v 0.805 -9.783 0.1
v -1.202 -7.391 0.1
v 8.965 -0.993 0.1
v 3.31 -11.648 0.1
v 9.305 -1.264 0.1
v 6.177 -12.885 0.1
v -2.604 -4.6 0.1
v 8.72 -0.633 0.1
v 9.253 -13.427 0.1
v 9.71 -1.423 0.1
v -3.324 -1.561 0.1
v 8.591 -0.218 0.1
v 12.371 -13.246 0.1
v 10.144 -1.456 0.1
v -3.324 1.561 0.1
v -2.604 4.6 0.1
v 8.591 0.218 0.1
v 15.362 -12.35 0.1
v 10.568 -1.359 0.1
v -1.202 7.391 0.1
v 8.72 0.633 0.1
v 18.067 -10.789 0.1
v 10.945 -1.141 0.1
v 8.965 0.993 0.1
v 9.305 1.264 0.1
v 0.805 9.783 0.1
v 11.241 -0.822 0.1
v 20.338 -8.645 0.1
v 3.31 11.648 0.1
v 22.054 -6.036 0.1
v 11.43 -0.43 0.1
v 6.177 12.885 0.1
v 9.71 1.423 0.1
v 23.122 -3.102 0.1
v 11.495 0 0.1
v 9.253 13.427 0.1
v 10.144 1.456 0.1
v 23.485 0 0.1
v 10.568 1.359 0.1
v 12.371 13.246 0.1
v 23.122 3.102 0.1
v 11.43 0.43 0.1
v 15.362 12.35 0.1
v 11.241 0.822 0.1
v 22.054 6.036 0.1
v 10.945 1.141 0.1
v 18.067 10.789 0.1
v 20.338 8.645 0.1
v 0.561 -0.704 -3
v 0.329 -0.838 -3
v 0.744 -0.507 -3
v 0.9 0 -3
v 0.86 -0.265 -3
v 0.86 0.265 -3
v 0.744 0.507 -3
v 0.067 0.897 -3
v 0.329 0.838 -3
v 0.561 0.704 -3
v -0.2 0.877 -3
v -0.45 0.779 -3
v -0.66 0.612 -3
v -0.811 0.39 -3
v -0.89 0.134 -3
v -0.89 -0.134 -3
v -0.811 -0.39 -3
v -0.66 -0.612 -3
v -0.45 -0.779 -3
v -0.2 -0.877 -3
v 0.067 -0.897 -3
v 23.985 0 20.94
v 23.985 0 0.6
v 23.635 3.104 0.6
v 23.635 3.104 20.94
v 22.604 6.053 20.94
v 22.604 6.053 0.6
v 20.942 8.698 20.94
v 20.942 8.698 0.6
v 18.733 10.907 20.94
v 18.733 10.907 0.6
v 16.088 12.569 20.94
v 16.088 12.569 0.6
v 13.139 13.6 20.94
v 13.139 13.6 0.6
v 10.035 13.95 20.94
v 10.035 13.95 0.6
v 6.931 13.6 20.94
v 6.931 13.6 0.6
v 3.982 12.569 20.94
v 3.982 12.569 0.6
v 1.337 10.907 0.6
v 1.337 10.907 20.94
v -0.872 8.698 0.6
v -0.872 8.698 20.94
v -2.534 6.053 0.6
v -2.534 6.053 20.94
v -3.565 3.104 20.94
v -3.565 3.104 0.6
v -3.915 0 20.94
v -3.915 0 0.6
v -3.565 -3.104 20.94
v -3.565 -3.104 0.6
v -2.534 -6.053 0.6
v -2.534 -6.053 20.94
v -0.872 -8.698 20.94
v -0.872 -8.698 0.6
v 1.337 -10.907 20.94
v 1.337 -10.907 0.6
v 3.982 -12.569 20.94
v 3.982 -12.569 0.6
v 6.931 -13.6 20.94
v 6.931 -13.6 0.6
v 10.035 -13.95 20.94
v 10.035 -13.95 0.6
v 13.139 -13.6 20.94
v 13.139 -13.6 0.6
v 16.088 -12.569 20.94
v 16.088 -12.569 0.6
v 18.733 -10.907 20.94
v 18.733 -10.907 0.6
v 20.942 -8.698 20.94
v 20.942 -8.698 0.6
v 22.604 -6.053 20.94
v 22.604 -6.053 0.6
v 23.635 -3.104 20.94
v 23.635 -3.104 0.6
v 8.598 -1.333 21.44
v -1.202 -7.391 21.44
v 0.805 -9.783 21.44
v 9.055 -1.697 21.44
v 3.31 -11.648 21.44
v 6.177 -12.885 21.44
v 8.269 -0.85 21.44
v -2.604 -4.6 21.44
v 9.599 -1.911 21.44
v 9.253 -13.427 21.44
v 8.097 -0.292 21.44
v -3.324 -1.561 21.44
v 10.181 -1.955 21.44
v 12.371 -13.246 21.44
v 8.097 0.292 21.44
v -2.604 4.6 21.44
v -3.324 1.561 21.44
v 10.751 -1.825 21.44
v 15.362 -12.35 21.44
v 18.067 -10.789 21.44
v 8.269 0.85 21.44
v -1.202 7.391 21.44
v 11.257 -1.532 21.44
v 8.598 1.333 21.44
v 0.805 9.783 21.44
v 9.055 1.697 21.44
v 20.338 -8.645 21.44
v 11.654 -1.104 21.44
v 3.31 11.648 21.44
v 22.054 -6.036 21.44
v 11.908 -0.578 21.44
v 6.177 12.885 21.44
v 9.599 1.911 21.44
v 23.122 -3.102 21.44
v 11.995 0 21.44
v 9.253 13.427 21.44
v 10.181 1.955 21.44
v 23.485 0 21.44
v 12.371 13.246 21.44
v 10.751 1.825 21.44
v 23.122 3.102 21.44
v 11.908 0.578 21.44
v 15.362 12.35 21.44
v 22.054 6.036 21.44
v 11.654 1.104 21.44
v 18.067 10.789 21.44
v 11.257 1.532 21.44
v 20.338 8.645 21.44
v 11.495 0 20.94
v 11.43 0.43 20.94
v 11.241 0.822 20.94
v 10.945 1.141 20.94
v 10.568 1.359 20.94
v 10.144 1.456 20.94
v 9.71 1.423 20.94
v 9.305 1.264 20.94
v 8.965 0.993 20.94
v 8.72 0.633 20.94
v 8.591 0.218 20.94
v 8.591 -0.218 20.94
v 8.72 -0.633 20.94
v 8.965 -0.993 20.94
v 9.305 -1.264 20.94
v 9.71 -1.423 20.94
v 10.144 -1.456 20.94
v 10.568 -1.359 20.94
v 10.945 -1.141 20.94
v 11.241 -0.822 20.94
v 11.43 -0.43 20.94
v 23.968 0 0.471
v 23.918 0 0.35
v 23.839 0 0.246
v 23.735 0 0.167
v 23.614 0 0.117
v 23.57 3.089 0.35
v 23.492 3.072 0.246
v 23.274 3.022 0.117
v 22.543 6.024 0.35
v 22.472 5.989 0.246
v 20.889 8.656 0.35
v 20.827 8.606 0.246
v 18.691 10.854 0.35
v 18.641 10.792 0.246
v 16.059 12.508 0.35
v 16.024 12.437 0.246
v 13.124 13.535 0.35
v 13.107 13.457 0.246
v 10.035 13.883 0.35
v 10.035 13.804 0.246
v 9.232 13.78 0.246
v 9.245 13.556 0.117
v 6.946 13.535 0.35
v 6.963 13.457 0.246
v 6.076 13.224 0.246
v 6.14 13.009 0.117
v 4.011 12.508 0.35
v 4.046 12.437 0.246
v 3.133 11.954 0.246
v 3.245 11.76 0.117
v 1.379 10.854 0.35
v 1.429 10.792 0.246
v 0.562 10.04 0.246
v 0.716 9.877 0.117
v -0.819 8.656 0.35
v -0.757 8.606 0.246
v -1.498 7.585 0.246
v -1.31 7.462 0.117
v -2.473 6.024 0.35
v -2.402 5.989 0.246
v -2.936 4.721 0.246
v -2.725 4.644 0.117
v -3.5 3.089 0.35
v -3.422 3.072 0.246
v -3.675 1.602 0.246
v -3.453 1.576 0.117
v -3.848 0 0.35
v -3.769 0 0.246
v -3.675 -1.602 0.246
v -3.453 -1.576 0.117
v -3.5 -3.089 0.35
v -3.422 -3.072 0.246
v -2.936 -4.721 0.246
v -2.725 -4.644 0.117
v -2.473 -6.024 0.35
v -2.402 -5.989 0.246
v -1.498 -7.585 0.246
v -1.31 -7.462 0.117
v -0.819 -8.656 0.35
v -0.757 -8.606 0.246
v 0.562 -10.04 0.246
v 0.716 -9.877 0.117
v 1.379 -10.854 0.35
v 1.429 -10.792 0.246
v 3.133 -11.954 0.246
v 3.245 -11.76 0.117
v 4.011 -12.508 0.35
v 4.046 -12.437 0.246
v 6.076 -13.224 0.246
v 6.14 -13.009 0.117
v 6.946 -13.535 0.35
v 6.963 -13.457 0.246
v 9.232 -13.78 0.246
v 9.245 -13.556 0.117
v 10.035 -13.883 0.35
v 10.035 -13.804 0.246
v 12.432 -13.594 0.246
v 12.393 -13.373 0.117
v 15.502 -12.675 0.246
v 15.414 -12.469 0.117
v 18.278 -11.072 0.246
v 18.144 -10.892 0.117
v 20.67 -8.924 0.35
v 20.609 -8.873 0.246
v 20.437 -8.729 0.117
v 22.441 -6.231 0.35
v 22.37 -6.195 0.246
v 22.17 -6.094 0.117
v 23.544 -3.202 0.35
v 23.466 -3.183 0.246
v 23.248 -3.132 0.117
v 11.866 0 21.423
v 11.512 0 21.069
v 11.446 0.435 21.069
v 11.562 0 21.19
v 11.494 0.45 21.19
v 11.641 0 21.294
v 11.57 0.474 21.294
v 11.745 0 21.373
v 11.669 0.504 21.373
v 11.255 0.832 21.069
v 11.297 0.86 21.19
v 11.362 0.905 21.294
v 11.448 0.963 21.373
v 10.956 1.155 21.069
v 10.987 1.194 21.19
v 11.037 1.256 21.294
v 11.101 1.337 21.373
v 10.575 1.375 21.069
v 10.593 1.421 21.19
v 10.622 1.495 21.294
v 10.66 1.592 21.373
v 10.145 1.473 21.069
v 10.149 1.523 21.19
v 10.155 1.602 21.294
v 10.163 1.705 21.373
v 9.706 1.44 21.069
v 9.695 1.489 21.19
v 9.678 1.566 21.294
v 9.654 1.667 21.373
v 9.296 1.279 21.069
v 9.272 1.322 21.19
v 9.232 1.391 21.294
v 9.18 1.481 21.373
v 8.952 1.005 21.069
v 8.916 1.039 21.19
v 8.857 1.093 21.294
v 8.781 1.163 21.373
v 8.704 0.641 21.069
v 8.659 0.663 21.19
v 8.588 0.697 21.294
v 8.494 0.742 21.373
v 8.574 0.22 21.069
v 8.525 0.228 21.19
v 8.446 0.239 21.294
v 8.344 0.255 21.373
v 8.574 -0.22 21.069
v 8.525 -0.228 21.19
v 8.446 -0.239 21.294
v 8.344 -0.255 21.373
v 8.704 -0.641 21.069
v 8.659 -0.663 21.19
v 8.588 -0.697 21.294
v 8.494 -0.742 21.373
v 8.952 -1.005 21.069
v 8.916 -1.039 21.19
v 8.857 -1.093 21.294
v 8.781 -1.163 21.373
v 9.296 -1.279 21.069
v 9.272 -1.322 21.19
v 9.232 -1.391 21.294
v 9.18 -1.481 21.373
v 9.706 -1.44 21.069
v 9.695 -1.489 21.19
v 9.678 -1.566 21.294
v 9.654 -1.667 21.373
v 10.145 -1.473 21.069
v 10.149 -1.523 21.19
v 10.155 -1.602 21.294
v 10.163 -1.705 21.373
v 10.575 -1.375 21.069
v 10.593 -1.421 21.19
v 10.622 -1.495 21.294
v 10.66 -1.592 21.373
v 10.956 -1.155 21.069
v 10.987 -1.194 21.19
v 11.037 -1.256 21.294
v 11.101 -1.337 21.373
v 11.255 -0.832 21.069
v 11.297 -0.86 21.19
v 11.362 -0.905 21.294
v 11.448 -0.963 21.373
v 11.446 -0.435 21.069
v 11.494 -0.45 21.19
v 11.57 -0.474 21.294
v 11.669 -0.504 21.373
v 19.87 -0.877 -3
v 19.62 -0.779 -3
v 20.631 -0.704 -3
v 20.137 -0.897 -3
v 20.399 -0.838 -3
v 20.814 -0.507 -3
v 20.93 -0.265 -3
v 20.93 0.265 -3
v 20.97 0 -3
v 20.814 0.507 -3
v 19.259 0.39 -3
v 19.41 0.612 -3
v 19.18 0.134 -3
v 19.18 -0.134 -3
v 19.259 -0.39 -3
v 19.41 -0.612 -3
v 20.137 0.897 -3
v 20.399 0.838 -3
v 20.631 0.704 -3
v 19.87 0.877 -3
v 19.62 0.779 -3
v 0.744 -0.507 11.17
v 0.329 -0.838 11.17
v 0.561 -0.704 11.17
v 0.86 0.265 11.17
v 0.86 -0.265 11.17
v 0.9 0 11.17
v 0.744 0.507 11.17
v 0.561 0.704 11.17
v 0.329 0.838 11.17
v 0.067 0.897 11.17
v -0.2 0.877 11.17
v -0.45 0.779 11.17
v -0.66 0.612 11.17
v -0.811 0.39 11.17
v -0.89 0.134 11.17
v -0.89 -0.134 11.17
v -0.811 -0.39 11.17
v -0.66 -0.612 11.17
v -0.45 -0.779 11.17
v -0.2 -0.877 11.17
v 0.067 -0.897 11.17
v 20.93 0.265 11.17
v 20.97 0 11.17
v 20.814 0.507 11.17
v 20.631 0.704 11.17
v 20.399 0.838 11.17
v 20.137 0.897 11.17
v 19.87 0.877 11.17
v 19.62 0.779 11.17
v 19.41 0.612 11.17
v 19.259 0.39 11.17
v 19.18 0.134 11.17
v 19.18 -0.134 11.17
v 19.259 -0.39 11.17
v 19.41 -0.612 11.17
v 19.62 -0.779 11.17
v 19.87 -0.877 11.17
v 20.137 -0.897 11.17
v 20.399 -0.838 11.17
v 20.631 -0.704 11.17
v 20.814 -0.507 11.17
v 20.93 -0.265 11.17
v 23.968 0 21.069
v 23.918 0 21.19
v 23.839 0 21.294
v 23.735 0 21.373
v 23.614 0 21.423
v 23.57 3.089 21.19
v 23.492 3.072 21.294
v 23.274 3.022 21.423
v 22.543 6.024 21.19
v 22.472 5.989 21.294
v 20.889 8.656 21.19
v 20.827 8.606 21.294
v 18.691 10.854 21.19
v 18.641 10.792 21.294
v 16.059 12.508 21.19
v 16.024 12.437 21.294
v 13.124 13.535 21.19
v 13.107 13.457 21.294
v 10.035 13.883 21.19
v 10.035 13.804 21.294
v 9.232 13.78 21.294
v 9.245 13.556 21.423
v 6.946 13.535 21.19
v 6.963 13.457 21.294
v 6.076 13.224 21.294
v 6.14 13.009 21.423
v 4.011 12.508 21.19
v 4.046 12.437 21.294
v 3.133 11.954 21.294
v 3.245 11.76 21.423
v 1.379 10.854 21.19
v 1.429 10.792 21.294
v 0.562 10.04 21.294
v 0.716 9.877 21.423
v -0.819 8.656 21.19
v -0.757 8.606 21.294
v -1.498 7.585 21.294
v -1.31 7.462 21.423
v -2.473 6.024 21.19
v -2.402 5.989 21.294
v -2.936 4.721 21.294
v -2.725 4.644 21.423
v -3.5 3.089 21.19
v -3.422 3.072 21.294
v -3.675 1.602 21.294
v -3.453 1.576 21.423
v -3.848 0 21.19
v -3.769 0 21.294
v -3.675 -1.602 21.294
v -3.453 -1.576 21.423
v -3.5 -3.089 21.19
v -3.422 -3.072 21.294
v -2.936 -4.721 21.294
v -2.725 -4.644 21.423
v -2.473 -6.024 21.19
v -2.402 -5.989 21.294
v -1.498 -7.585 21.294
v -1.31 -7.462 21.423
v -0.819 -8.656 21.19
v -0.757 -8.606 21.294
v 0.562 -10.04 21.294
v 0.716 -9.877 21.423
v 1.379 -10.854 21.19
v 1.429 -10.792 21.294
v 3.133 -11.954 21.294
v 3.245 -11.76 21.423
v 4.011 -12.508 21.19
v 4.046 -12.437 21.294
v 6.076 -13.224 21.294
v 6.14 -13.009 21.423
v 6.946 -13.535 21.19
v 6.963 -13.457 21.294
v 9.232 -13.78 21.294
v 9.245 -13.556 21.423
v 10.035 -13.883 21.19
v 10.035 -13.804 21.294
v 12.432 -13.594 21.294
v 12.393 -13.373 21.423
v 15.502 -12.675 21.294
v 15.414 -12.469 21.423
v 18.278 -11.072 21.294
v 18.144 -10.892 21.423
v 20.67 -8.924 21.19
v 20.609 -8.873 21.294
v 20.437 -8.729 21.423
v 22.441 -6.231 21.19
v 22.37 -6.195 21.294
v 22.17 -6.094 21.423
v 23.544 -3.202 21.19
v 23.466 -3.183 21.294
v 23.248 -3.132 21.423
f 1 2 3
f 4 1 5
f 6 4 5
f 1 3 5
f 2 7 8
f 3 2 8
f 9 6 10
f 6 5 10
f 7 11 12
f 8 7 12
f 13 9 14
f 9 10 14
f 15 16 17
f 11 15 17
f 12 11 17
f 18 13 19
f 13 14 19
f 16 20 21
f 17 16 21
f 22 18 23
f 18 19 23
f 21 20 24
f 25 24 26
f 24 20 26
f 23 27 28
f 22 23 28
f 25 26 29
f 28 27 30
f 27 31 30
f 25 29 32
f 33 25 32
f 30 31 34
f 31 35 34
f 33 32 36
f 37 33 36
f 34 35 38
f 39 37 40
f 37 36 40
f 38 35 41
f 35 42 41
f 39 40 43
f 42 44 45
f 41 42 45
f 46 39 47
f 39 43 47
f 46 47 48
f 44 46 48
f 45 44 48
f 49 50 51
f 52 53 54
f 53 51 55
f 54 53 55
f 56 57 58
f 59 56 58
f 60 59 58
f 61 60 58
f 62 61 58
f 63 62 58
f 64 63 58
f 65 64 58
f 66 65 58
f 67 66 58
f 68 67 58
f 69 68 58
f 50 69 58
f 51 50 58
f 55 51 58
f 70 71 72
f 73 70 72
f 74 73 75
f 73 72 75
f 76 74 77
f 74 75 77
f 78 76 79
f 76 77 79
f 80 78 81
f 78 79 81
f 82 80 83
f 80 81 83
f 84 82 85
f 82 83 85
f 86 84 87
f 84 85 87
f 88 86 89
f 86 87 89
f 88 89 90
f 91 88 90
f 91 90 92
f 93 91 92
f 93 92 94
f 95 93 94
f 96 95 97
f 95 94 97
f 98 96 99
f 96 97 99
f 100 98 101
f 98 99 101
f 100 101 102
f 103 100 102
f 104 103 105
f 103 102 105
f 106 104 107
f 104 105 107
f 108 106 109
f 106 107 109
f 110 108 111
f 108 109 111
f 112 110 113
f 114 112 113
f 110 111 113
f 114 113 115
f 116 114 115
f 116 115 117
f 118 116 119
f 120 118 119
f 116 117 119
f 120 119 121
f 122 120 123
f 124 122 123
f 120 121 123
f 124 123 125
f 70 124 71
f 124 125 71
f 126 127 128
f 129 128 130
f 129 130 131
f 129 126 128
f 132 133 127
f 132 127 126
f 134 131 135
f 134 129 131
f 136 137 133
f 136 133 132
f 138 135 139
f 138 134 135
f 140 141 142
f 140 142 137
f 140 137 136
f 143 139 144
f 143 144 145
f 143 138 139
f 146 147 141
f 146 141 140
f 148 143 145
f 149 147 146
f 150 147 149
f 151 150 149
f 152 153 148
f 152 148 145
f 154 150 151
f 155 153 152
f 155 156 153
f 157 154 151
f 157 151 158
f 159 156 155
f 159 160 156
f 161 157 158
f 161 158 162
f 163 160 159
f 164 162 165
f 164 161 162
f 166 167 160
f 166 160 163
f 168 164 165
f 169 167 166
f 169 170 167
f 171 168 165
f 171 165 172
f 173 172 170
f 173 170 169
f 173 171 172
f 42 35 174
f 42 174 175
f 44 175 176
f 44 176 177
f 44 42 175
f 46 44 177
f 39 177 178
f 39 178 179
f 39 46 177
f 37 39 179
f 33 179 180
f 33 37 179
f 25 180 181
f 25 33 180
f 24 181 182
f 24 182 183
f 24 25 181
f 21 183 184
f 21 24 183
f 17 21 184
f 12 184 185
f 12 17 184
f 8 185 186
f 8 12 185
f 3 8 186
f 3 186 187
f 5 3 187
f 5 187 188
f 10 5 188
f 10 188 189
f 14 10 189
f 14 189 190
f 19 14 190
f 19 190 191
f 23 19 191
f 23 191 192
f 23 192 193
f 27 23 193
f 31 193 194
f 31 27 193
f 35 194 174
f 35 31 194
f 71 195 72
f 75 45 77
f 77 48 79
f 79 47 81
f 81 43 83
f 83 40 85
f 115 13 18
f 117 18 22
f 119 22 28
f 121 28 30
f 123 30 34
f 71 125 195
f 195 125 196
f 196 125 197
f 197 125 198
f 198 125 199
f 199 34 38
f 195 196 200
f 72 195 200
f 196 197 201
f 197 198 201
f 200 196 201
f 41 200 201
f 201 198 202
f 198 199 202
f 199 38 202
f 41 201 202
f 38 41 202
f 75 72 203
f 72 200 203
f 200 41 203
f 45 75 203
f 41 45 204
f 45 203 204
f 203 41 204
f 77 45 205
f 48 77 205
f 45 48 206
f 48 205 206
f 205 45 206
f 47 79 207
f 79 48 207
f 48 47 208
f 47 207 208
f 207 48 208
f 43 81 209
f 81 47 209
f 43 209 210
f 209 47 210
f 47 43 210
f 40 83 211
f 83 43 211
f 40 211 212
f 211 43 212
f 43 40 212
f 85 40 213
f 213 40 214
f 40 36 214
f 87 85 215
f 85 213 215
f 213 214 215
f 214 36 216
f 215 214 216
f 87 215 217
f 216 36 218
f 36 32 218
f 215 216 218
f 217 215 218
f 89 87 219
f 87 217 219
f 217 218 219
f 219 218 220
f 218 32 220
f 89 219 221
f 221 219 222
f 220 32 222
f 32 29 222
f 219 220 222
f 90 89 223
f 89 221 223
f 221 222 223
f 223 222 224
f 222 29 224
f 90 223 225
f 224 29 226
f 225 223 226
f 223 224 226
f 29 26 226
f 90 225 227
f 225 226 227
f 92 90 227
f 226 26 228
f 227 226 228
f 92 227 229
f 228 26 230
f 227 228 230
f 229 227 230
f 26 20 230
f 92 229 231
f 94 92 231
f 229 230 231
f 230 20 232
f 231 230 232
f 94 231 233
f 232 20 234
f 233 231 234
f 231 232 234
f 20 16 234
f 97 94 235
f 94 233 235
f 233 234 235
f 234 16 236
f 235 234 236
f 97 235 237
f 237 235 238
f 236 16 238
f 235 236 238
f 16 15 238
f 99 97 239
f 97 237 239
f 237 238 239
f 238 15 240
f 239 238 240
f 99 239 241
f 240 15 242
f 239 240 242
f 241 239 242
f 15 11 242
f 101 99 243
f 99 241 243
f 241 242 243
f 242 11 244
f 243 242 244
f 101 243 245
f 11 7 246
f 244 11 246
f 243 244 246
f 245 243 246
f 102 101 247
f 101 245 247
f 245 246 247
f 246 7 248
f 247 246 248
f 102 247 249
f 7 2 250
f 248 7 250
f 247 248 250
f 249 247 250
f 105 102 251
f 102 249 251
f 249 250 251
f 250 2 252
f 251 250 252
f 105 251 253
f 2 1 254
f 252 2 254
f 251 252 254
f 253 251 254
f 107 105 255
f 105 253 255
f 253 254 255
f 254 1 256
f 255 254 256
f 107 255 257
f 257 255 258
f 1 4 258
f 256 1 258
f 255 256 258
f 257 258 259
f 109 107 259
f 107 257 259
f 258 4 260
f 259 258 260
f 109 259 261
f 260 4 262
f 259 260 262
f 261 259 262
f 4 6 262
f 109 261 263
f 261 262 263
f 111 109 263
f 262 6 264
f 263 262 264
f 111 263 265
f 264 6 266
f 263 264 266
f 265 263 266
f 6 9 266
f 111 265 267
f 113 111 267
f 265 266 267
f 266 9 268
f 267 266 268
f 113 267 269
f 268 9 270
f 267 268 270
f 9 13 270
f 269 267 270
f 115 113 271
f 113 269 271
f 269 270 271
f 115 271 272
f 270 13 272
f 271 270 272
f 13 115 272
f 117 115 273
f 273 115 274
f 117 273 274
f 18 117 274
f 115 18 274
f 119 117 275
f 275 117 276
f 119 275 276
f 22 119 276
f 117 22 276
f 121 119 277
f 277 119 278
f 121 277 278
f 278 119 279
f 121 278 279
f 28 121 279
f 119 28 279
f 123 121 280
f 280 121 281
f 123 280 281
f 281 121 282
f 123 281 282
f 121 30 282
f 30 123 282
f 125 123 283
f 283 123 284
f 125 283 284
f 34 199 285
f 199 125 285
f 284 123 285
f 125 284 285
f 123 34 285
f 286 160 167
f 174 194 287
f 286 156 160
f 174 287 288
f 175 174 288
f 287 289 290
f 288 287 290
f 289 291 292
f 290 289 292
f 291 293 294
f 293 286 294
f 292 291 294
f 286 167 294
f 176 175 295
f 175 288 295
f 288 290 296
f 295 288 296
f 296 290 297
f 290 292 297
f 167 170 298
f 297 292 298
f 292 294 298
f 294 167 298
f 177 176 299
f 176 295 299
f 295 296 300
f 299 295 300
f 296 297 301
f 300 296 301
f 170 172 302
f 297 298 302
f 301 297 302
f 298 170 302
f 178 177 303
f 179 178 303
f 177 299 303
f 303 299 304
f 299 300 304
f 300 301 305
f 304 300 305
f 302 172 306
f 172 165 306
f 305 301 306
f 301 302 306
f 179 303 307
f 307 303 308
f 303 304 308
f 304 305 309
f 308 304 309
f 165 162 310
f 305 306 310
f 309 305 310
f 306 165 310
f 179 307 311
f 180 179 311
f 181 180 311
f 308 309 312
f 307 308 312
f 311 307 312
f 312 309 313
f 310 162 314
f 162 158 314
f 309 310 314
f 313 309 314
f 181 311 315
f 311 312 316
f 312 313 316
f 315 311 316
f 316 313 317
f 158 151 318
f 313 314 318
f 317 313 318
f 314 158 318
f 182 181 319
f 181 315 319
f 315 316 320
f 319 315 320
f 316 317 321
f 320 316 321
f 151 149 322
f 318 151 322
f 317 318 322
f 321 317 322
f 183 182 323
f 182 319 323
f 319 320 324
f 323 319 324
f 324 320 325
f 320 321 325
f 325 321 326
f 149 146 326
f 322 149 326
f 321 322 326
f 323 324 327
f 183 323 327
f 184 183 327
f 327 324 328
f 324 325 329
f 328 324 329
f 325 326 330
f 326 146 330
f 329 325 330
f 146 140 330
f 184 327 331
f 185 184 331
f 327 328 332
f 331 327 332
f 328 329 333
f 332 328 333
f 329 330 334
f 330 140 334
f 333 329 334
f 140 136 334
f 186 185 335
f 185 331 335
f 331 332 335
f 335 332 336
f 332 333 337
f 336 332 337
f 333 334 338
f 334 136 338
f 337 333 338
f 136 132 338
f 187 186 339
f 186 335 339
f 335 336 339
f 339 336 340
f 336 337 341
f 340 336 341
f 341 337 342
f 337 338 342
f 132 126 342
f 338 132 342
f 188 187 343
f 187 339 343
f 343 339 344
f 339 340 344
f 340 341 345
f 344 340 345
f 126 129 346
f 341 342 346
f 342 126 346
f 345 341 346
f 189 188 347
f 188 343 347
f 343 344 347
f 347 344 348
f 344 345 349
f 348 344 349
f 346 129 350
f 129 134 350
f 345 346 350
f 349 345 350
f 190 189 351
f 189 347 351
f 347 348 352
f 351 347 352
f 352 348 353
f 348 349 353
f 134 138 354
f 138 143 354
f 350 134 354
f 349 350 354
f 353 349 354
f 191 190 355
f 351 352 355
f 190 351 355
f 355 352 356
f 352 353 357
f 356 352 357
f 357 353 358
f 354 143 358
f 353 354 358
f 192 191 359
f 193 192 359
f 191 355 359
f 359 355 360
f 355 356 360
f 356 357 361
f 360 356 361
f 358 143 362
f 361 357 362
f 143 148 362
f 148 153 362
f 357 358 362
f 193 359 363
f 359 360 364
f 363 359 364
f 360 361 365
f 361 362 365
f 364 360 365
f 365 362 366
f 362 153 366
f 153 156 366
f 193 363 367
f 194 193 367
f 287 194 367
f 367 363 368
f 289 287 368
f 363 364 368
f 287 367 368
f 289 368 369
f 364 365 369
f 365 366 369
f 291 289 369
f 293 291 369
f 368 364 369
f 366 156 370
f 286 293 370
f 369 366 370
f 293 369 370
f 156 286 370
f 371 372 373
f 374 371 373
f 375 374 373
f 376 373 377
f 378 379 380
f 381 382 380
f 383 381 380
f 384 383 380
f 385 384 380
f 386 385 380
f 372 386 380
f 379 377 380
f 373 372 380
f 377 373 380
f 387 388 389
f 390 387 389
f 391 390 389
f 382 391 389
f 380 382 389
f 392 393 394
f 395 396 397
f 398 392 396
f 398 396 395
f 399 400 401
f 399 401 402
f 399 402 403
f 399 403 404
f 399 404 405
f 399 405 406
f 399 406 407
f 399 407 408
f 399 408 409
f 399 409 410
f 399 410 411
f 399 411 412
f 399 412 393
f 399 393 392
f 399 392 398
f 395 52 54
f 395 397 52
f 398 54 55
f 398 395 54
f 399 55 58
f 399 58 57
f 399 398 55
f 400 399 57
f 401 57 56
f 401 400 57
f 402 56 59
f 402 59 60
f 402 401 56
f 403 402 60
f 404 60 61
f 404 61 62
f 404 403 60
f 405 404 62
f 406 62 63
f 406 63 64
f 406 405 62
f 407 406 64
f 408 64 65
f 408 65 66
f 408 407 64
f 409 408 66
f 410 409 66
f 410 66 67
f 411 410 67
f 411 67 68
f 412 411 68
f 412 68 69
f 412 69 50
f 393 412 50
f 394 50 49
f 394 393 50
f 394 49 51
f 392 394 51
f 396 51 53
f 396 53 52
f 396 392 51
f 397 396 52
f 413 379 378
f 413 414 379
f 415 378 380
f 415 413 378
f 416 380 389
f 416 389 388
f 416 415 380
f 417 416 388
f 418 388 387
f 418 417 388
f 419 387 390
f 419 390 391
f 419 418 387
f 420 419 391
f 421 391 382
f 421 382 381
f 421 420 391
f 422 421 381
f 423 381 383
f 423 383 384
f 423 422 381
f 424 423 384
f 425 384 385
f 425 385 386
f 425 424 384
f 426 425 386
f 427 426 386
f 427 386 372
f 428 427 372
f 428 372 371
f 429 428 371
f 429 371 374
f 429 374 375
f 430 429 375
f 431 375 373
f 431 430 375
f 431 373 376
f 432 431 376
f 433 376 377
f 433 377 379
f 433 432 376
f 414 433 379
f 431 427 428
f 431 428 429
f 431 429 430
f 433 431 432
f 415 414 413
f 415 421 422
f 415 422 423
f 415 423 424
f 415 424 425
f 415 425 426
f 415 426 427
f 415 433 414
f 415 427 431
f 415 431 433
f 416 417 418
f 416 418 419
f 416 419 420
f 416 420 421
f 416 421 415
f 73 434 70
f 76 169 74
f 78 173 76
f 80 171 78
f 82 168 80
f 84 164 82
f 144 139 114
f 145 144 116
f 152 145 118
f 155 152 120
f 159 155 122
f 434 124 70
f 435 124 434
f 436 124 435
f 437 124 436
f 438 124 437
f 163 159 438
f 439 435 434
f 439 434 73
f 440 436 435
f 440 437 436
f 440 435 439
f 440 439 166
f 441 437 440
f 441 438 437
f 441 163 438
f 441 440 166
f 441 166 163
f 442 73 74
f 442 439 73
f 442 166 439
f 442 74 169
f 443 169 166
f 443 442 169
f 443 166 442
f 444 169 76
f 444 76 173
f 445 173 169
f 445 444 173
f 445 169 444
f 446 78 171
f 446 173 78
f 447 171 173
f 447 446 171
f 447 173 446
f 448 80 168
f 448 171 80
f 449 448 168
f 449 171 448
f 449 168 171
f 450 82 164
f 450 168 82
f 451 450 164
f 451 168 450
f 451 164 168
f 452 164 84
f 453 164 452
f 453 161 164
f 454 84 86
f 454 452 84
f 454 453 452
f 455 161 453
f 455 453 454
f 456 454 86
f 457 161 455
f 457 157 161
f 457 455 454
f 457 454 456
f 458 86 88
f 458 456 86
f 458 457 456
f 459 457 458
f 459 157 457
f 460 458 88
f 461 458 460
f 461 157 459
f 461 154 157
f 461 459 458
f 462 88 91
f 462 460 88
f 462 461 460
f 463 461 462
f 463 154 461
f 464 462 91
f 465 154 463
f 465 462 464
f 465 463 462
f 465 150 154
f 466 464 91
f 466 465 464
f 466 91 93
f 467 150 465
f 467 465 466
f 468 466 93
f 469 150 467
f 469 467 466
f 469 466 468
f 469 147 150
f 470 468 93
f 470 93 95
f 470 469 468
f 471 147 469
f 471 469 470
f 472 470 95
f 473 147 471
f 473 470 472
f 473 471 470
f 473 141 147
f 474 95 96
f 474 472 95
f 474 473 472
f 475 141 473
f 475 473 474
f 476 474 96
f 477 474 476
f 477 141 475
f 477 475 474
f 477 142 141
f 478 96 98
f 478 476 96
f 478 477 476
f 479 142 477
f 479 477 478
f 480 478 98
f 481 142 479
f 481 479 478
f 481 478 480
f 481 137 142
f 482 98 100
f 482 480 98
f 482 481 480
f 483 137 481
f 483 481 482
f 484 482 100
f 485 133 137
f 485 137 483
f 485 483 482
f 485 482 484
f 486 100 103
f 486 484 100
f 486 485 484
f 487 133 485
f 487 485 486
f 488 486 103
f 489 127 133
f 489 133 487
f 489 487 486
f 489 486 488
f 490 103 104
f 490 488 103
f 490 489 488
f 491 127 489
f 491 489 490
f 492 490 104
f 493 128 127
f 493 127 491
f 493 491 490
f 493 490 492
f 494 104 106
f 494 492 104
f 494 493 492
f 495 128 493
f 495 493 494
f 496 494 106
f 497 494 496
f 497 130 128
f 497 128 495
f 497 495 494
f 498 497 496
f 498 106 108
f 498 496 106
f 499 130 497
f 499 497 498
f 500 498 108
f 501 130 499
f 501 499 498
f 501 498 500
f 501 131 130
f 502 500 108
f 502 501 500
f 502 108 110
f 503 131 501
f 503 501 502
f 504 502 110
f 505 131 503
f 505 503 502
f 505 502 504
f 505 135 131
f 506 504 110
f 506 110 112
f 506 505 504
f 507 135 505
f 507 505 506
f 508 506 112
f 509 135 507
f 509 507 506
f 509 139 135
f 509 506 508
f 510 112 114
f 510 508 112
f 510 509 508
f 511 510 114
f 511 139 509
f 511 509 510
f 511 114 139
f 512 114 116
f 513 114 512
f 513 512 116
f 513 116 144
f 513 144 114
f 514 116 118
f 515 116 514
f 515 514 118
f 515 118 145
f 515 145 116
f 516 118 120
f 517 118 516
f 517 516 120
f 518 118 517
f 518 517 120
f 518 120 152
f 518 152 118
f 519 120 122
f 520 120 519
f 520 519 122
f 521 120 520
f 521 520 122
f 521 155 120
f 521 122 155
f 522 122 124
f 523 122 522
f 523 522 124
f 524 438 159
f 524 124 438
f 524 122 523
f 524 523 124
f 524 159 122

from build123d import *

# Parameters (mm, degrees)
SKETCH001_R       = 0.9
PAD001_DEPTH      = 10.67
PAD001_DEPTH_BACK = 3.5
SKETCH_R          = 13.95
SKETCH_R_2        = 1.46
PAD_DEPTH         = 21.34
FILLET_R          = 0.5


with BuildPart() as pad001:
    # Sketch001 → Pad001 (new body, two sides)
    with BuildSketch(Plane.XY.offset(0.5)) as pad001_sk:
        Circle(SKETCH001_R)
        with Locations((20.07, 0)):
            Circle(SKETCH001_R)
    extrude(amount=PAD001_DEPTH)
    extrude(pad001_sk.sketch, amount=-PAD001_DEPTH_BACK)


with BuildPart() as fillet_body:
    # Sketch → Pad (new body)
    with BuildSketch(Plane.XY.offset(0.1)):
        with Locations((10.035, 0)):
            Circle(SKETCH_R)
        with Locations((10.035, 0)):
            Circle(SKETCH_R_2, mode=Mode.SUBTRACT)
    extrude(amount=PAD_DEPTH)

    # Fillet
    fillet_edges = [fillet_body.edges().sort_by_distance(p)[0] for p in [
        (8.575, 0, 21.44),
        (-3.915, 0, 21.44),
        (-3.915, 0, 0.1),
    ]]
    fillet(fillet_edges, radius=FILLET_R)


solid = Compound([pad001.part, fillet_body.part])
